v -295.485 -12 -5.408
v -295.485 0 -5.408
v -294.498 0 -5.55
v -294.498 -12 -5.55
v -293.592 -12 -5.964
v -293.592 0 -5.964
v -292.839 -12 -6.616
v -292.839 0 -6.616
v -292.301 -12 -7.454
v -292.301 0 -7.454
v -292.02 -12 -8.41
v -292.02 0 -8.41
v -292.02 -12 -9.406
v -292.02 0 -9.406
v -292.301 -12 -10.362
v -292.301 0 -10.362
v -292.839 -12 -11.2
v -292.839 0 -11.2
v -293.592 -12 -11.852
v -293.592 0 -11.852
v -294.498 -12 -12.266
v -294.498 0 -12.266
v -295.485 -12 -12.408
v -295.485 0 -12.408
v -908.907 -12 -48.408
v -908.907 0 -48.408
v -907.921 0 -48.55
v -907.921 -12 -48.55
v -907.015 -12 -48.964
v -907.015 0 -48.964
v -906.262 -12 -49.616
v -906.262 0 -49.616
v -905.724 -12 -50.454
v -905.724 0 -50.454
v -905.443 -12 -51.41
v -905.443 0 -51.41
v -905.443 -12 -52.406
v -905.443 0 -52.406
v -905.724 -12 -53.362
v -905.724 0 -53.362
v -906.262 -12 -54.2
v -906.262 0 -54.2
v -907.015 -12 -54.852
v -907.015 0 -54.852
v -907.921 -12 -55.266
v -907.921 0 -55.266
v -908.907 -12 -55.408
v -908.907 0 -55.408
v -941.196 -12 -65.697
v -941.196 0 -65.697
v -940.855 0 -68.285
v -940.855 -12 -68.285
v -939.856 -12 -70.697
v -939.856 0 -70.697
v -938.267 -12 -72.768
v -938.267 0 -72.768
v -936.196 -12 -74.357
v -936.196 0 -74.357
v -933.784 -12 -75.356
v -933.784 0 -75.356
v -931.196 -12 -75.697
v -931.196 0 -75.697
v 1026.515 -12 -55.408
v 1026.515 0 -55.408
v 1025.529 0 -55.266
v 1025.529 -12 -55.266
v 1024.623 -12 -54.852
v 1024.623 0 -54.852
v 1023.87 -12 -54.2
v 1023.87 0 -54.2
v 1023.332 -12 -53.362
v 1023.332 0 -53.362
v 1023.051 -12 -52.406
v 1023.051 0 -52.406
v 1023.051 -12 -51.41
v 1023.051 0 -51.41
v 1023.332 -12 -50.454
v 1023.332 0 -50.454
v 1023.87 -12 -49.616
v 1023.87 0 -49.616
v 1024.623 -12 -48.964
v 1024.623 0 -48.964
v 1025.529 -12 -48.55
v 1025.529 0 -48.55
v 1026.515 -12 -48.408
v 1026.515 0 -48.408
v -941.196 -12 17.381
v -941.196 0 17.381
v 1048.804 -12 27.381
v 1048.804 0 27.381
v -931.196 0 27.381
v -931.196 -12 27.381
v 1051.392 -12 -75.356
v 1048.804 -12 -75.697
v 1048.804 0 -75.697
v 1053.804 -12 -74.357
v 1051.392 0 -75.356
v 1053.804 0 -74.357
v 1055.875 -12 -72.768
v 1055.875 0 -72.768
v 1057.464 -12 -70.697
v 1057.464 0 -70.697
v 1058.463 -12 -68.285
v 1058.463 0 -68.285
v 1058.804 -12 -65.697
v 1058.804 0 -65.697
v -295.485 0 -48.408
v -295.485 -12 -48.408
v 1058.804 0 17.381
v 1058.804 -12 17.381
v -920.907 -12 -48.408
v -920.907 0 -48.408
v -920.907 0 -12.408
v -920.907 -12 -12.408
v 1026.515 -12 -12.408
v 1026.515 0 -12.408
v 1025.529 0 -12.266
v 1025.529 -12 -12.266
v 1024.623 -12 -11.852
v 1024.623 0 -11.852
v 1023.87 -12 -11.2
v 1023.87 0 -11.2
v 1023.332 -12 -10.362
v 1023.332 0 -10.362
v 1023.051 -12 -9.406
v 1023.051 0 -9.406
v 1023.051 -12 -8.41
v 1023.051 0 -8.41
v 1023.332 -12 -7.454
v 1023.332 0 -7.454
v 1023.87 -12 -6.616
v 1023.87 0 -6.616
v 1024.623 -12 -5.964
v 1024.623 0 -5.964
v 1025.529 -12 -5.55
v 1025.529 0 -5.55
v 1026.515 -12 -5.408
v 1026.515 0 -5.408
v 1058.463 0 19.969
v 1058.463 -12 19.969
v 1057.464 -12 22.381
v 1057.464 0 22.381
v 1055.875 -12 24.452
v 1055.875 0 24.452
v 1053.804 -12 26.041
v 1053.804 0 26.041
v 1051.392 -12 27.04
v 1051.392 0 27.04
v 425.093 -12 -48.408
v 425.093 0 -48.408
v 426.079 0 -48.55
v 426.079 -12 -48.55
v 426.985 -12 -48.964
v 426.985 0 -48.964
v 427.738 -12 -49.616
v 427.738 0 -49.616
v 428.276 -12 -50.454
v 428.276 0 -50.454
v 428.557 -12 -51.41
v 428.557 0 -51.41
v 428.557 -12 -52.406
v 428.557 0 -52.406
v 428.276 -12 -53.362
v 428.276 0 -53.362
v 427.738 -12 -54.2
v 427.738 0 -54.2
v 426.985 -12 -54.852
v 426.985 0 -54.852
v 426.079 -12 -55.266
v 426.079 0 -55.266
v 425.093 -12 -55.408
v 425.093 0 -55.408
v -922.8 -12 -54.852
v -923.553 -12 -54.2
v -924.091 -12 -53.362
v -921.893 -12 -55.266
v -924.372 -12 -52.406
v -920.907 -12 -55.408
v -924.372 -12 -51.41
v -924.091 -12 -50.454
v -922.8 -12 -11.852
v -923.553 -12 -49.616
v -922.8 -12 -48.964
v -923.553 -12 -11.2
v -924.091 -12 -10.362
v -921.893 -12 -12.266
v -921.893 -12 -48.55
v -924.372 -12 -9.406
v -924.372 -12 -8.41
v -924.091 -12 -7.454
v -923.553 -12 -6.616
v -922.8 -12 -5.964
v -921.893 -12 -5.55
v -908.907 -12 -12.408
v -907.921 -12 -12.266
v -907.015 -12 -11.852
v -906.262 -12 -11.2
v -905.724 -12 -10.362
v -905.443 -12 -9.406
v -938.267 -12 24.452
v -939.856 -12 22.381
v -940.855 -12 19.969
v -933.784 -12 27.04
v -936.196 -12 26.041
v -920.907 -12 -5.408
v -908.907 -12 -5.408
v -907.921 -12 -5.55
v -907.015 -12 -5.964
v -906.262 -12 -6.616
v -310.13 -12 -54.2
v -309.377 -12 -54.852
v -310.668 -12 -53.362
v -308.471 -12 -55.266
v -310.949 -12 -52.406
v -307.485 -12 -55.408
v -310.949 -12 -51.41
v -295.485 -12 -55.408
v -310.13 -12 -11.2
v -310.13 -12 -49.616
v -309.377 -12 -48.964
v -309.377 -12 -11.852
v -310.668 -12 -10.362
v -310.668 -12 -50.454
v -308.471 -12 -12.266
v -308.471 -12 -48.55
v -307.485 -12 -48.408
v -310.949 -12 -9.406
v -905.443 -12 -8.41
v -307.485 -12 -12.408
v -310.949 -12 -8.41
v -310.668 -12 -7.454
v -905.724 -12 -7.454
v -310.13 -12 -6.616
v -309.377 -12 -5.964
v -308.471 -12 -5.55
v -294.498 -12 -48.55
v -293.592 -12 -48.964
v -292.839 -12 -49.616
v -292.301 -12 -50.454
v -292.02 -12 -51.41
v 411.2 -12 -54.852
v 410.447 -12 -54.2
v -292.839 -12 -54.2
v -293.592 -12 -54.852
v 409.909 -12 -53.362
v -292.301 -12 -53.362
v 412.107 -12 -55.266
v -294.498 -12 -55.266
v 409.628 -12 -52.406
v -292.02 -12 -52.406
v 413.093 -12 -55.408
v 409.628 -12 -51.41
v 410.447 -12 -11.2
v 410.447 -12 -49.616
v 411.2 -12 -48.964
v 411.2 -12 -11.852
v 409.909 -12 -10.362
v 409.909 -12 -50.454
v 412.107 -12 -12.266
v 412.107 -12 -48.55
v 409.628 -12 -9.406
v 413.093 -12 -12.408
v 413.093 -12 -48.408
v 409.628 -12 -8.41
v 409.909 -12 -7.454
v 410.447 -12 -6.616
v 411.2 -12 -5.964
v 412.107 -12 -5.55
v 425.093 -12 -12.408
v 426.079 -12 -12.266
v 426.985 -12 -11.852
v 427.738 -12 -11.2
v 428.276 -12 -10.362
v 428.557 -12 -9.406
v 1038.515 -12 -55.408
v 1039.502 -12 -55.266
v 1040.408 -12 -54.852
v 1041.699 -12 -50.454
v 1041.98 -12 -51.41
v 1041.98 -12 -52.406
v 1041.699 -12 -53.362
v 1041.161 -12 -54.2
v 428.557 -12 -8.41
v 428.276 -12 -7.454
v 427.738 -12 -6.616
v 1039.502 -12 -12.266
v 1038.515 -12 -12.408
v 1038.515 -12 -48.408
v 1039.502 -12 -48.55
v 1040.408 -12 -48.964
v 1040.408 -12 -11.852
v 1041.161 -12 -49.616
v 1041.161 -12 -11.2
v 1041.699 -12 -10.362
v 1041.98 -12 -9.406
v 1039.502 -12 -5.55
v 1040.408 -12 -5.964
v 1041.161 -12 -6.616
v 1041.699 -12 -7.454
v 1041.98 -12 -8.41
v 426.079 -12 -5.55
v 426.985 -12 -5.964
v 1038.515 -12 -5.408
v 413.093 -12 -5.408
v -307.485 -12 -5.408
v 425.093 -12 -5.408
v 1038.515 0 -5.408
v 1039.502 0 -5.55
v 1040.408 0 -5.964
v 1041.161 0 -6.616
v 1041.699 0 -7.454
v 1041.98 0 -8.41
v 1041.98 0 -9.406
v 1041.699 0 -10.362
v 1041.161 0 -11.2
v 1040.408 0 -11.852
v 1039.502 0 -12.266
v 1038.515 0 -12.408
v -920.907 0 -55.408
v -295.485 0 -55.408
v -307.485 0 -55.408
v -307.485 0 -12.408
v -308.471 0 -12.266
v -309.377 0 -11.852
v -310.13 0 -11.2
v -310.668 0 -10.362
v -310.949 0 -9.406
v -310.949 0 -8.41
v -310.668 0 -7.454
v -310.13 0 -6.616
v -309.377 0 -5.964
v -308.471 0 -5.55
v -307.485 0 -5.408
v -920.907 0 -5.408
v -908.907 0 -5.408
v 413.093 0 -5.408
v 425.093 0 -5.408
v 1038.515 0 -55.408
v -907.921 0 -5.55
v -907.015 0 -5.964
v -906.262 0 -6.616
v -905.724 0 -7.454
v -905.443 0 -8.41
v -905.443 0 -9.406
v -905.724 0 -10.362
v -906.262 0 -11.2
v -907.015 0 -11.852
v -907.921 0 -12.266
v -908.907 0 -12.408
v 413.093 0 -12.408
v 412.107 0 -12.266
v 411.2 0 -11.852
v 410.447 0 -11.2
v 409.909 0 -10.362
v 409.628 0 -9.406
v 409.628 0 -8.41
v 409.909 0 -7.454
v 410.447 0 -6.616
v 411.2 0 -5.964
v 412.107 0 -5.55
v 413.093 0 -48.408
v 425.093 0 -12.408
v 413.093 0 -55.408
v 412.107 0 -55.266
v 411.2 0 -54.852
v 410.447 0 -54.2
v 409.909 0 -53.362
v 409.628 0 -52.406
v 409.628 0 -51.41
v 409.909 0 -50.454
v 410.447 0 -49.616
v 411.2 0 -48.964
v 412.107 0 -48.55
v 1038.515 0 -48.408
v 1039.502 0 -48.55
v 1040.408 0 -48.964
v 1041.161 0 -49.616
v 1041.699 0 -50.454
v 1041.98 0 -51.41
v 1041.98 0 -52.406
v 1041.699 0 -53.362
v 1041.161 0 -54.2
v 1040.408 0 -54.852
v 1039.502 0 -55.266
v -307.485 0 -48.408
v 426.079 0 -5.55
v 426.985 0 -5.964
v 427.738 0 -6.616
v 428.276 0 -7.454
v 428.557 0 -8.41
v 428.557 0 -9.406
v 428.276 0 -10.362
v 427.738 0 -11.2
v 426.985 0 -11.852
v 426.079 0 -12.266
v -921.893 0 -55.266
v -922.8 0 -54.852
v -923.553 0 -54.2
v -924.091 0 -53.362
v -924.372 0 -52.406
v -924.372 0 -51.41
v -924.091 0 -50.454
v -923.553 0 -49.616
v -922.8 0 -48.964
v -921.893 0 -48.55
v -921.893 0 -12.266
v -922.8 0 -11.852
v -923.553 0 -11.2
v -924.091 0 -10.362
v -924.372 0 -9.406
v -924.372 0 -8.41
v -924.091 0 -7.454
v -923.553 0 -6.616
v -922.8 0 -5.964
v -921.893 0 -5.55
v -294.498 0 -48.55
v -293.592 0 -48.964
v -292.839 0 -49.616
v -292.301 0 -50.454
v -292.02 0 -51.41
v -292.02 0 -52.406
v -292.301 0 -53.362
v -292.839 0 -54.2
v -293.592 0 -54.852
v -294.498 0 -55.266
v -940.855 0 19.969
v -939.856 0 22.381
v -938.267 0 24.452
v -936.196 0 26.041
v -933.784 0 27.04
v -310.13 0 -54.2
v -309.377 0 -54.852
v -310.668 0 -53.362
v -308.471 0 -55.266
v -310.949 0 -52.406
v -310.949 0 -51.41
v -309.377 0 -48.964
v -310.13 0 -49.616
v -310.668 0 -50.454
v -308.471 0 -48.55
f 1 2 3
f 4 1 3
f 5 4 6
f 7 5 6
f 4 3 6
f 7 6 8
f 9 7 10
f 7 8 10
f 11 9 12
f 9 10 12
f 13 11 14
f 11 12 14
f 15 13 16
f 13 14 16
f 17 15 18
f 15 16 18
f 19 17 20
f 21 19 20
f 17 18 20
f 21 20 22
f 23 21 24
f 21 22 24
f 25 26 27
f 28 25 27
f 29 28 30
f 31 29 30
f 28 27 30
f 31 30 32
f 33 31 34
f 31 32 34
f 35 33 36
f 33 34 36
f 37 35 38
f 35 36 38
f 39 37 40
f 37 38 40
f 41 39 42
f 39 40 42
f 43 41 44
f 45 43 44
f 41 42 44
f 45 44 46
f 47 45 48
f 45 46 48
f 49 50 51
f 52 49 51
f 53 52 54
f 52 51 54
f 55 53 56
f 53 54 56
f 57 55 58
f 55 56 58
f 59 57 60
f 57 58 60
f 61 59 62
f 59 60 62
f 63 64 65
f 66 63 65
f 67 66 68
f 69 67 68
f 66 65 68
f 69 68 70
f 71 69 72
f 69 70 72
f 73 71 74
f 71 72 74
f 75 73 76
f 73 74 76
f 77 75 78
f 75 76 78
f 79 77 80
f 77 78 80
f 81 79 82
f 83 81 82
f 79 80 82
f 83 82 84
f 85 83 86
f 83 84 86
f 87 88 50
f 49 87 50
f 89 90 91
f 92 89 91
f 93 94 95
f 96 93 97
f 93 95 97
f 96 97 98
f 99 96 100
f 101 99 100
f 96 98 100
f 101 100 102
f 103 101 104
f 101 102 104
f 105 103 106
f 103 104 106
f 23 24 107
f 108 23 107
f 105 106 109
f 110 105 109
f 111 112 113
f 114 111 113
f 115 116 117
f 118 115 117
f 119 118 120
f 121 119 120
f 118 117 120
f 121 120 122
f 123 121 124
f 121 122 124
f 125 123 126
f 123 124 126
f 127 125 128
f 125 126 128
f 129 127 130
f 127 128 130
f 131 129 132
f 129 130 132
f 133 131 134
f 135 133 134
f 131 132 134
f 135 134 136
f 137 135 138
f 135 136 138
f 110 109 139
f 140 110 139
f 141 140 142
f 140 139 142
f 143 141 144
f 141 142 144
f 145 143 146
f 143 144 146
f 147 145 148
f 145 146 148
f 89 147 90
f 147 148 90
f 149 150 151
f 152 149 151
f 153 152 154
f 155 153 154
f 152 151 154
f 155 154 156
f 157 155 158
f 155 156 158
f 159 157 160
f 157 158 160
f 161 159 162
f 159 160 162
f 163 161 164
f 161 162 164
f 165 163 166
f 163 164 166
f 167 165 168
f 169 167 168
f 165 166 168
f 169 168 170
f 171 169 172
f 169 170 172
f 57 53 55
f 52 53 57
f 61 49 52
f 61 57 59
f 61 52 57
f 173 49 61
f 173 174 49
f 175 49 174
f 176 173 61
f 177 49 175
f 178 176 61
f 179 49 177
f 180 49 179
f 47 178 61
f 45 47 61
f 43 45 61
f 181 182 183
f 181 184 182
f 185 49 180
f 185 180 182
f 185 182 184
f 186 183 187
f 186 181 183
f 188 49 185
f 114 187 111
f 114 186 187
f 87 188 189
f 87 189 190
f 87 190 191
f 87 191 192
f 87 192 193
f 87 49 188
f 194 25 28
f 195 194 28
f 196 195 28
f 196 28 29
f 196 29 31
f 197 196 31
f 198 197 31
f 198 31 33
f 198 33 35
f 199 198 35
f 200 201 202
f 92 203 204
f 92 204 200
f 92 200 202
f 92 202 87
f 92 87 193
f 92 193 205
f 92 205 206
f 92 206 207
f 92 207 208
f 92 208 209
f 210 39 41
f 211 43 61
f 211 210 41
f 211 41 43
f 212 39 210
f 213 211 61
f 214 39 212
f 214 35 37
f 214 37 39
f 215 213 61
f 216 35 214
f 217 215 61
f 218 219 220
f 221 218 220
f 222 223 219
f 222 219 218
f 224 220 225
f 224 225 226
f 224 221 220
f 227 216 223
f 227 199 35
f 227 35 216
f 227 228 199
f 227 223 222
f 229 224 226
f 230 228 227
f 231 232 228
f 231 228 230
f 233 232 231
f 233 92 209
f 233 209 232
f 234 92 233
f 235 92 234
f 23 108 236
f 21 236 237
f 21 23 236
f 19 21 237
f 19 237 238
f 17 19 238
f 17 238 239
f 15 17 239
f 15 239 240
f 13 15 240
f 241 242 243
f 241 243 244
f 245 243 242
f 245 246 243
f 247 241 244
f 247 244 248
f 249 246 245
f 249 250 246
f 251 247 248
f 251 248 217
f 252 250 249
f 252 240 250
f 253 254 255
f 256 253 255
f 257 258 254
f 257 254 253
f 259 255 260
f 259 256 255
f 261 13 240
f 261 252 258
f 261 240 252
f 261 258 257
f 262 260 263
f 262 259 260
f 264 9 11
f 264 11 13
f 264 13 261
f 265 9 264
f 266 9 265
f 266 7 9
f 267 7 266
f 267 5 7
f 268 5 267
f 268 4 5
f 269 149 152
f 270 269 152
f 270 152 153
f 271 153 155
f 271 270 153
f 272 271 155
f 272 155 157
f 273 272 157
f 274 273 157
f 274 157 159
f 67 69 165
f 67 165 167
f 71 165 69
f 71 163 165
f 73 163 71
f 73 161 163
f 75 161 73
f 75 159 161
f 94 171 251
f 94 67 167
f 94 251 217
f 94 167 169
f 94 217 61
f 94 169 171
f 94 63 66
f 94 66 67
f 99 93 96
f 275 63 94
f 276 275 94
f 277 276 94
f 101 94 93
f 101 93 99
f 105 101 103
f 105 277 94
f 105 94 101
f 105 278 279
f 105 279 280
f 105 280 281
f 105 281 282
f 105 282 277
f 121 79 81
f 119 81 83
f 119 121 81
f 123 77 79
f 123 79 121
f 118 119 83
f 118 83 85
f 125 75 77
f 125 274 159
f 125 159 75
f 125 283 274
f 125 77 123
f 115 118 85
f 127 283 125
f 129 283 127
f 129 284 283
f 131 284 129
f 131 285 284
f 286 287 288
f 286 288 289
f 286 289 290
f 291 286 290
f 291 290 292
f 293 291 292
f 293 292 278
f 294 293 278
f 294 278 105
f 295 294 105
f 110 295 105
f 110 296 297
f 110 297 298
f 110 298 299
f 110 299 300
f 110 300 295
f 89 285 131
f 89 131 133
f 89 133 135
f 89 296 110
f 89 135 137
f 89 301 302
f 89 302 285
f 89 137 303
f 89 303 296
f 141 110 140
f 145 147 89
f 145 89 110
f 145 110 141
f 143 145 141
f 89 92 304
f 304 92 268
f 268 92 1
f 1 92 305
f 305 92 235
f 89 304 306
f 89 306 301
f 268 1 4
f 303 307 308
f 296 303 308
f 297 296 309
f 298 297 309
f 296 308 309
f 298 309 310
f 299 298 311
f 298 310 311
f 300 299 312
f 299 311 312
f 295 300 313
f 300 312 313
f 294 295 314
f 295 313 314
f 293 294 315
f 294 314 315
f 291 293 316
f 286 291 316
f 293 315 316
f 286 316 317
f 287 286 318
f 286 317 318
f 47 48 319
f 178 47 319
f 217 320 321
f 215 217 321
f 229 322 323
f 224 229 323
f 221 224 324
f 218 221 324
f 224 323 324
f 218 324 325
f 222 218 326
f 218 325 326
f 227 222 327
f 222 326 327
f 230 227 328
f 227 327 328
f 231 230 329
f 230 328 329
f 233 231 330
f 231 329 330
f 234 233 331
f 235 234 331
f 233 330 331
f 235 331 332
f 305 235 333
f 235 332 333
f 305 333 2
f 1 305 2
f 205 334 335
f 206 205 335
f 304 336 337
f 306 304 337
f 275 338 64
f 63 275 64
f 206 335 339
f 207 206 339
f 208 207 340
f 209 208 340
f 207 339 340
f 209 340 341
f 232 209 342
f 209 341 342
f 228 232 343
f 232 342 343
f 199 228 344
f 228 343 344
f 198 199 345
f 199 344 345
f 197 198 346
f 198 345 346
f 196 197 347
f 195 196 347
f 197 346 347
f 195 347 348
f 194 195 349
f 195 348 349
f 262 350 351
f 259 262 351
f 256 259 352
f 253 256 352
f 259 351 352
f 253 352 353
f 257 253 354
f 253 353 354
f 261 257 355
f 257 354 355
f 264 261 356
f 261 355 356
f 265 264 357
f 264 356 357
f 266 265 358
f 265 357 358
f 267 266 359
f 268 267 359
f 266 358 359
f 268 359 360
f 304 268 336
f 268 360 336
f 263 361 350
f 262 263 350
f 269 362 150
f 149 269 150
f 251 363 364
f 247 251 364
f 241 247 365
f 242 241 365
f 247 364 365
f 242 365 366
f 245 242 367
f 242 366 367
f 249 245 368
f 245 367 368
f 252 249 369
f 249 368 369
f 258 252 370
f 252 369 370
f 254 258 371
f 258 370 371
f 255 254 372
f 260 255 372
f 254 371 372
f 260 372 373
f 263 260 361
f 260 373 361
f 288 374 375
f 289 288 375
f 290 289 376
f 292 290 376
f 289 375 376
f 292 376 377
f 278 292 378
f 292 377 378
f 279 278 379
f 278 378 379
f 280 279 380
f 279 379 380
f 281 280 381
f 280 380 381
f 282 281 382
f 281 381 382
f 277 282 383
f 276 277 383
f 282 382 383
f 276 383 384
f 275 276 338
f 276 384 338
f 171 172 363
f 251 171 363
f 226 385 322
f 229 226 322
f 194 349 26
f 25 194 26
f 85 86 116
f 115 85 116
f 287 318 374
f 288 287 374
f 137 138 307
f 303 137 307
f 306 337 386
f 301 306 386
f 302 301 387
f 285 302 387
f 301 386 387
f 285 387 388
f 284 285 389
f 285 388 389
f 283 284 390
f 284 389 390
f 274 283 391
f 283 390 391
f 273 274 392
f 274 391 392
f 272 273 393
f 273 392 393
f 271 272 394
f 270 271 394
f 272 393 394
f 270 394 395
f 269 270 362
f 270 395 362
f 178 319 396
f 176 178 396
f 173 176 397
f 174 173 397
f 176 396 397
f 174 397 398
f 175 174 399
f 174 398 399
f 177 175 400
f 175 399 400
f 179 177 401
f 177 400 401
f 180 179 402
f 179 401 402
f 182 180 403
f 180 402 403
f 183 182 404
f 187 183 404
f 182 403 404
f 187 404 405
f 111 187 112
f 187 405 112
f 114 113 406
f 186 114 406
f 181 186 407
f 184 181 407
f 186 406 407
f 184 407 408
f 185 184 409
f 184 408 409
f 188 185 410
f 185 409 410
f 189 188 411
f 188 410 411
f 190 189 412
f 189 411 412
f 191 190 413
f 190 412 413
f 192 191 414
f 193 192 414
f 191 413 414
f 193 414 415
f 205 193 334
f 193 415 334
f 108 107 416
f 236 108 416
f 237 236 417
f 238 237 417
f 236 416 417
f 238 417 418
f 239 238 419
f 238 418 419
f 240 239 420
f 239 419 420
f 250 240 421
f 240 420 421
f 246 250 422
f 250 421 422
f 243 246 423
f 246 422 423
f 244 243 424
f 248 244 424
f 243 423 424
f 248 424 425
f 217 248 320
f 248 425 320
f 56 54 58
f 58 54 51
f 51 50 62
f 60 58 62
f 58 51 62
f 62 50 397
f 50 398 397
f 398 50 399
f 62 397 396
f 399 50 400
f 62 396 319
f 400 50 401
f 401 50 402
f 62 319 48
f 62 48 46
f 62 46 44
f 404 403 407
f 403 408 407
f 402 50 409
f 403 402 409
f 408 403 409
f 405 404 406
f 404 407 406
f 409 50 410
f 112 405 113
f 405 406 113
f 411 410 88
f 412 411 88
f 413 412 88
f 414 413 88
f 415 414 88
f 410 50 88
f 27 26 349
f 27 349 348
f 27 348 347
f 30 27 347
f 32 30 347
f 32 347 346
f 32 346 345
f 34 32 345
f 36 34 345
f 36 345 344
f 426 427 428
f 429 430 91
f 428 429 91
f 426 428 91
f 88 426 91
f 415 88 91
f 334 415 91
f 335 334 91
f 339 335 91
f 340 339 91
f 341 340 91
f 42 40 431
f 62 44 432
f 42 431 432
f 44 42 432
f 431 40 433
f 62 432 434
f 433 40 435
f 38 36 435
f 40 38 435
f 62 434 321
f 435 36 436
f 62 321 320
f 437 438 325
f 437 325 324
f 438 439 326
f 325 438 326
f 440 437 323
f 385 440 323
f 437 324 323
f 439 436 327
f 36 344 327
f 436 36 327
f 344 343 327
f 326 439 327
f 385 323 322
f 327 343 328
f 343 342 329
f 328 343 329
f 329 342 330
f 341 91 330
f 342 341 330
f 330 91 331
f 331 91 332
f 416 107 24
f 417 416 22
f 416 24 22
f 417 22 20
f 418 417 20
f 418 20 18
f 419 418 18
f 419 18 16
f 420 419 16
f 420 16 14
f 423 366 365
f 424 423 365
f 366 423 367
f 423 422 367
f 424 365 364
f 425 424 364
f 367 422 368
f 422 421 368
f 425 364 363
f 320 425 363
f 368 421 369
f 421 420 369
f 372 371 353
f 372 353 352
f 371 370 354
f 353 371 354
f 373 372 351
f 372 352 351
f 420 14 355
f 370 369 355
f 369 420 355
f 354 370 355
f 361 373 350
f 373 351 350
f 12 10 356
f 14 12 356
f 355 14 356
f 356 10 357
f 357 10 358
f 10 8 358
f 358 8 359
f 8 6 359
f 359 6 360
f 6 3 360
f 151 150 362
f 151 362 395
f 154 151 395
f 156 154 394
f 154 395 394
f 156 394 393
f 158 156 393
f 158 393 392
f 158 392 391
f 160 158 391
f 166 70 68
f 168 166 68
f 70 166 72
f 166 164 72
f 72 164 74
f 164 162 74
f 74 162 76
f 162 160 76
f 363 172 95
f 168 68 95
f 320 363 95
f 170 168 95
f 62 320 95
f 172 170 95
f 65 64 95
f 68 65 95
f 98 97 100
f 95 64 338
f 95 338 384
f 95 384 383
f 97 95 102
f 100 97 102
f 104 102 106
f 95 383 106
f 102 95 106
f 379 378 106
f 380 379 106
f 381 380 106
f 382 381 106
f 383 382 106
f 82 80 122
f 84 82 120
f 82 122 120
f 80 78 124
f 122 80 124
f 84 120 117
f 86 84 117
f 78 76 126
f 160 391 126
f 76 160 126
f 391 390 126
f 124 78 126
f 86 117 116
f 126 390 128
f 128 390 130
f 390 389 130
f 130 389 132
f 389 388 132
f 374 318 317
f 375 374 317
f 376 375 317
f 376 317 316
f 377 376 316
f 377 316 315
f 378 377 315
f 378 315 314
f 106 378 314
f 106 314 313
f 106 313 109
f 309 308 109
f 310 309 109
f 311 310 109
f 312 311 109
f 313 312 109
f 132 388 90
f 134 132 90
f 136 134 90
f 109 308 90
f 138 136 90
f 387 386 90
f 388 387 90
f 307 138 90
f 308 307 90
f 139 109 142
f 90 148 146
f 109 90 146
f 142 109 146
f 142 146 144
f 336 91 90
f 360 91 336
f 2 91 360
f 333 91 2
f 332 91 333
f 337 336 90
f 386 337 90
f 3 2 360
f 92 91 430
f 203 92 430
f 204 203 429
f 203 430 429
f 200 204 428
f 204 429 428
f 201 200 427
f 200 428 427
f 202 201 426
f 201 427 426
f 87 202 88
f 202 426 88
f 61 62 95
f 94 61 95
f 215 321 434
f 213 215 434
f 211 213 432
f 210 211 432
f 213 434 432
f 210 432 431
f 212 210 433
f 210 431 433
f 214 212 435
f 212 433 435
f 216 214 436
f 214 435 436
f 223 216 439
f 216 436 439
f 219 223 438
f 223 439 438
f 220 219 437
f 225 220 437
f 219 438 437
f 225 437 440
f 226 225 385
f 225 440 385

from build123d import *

# Parameters (mm, degrees)
F1_DEPTH = 12


with BuildPart() as f1:
    # F0 (on Front) → F1 (new body)
    with BuildSketch(Plane.XZ):
        with BuildLine():
            Line((1048.804035, 27.381052), (-931.195965, 27.381052))
            ThreePointArc((-931.195965, 27.381052), (-938.267033, 24.45212), (-941.195965, 17.381052))
            Line((-941.195965, 17.381052), (-941.195965, -65.696588))
            ThreePointArc((-941.195965, -65.696588), (-938.267033, -72.767655), (-931.195965, -75.696588))
            Line((-931.195965, -75.696588), (-920.907405, -75.696588))
            Line((-920.907405, -75.696588), (-902.907405, -75.696588))
            Line((-902.907405, -75.696588), (1048.804035, -75.696588))
            ThreePointArc((1048.804035, -75.696588), (1055.875103, -72.767655), (1058.804035, -65.696588))
            Line((1058.804035, -65.696588), (1058.804035, 17.381052))
            ThreePointArc((1058.804035, 17.381052), (1055.875103, 24.45212), (1048.804035, 27.381052))
        make_face()
        with BuildLine():
            ThreePointArc((-920.907405, -12.408028), (-924.407405, -8.908028), (-920.907405, -5.408028))
            Line((-920.907405, -5.408028), (-908.907405, -5.408028))
            ThreePointArc((-908.907405, -5.408028), (-905.407405, -8.908028), (-908.907405, -12.408028))
            Line((-908.907405, -12.408028), (-908.907405, -48.408028))
            ThreePointArc((-908.907405, -48.408028), (-905.407405, -51.908028), (-908.907405, -55.408028))
            Line((-908.907405, -55.408028), (-920.907405, -55.408028))
            ThreePointArc((-920.907405, -55.408028), (-924.407405, -51.908028), (-920.907405, -48.408028))
            Line((-920.907405, -48.408028), (-920.907405, -12.408028))
        make_face(mode=Mode.SUBTRACT)
        with BuildLine():
            Line((-295.484525, -12.408028), (-295.484525, -48.408028))
            ThreePointArc((-295.484525, -48.408028), (-291.984525, -51.908028), (-295.484525, -55.408028))
            Line((-295.484525, -55.408028), (-307.484525, -55.408028))
            ThreePointArc((-307.484525, -55.408028), (-310.984525, -51.908028), (-307.484525, -48.408028))
            Line((-307.484525, -48.408028), (-307.484525, -12.408028))
            ThreePointArc((-307.484525, -12.408028), (-310.984525, -8.908028), (-307.484525, -5.408028))
            Line((-307.484525, -5.408028), (-295.484525, -5.408028))
            ThreePointArc((-295.484525, -5.408028), (-291.984525, -8.908028), (-295.484525, -12.408028))
        make_face(mode=Mode.SUBTRACT)
        with BuildLine():
            ThreePointArc((413.092595, -55.408028), (409.592595, -51.908028), (413.092595, -48.408028))
            Line((413.092595, -48.408028), (413.092595, -12.408028))
            ThreePointArc((413.092595, -12.408028), (409.592595, -8.908028), (413.092595, -5.408028))
            Line((413.092595, -5.408028), (425.092595, -5.408028))
            ThreePointArc((425.092595, -5.408028), (428.592595, -8.908028), (425.092595, -12.408028))
            Line((425.092595, -12.408028), (425.092595, -48.408028))
            ThreePointArc((425.092595, -48.408028), (428.592595, -51.908028), (425.092595, -55.408028))
            Line((425.092595, -55.408028), (413.092595, -55.408028))
        make_face(mode=Mode.SUBTRACT)
        with BuildLine():
            ThreePointArc((1038.515475, -5.408028), (1042.015475, -8.908028), (1038.515475, -12.408028))
            Line((1038.515475, -12.408028), (1038.515475, -48.408028))
            ThreePointArc((1038.515475, -48.408028), (1042.015475, -51.908028), (1038.515475, -55.408028))
            Line((1038.515475, -55.408028), (1026.515475, -55.408028))
            ThreePointArc((1026.515475, -55.408028), (1023.015475, -51.908028), (1026.515475, -48.408028))
            Line((1026.515475, -48.408028), (1026.515475, -12.408028))
            ThreePointArc((1026.515475, -12.408028), (1023.015475, -8.908028), (1026.515475, -5.408028))
            Line((1026.515475, -5.408028), (1038.515475, -5.408028))
        make_face(mode=Mode.SUBTRACT)
    extrude(amount=F1_DEPTH)


solid = f1.part
